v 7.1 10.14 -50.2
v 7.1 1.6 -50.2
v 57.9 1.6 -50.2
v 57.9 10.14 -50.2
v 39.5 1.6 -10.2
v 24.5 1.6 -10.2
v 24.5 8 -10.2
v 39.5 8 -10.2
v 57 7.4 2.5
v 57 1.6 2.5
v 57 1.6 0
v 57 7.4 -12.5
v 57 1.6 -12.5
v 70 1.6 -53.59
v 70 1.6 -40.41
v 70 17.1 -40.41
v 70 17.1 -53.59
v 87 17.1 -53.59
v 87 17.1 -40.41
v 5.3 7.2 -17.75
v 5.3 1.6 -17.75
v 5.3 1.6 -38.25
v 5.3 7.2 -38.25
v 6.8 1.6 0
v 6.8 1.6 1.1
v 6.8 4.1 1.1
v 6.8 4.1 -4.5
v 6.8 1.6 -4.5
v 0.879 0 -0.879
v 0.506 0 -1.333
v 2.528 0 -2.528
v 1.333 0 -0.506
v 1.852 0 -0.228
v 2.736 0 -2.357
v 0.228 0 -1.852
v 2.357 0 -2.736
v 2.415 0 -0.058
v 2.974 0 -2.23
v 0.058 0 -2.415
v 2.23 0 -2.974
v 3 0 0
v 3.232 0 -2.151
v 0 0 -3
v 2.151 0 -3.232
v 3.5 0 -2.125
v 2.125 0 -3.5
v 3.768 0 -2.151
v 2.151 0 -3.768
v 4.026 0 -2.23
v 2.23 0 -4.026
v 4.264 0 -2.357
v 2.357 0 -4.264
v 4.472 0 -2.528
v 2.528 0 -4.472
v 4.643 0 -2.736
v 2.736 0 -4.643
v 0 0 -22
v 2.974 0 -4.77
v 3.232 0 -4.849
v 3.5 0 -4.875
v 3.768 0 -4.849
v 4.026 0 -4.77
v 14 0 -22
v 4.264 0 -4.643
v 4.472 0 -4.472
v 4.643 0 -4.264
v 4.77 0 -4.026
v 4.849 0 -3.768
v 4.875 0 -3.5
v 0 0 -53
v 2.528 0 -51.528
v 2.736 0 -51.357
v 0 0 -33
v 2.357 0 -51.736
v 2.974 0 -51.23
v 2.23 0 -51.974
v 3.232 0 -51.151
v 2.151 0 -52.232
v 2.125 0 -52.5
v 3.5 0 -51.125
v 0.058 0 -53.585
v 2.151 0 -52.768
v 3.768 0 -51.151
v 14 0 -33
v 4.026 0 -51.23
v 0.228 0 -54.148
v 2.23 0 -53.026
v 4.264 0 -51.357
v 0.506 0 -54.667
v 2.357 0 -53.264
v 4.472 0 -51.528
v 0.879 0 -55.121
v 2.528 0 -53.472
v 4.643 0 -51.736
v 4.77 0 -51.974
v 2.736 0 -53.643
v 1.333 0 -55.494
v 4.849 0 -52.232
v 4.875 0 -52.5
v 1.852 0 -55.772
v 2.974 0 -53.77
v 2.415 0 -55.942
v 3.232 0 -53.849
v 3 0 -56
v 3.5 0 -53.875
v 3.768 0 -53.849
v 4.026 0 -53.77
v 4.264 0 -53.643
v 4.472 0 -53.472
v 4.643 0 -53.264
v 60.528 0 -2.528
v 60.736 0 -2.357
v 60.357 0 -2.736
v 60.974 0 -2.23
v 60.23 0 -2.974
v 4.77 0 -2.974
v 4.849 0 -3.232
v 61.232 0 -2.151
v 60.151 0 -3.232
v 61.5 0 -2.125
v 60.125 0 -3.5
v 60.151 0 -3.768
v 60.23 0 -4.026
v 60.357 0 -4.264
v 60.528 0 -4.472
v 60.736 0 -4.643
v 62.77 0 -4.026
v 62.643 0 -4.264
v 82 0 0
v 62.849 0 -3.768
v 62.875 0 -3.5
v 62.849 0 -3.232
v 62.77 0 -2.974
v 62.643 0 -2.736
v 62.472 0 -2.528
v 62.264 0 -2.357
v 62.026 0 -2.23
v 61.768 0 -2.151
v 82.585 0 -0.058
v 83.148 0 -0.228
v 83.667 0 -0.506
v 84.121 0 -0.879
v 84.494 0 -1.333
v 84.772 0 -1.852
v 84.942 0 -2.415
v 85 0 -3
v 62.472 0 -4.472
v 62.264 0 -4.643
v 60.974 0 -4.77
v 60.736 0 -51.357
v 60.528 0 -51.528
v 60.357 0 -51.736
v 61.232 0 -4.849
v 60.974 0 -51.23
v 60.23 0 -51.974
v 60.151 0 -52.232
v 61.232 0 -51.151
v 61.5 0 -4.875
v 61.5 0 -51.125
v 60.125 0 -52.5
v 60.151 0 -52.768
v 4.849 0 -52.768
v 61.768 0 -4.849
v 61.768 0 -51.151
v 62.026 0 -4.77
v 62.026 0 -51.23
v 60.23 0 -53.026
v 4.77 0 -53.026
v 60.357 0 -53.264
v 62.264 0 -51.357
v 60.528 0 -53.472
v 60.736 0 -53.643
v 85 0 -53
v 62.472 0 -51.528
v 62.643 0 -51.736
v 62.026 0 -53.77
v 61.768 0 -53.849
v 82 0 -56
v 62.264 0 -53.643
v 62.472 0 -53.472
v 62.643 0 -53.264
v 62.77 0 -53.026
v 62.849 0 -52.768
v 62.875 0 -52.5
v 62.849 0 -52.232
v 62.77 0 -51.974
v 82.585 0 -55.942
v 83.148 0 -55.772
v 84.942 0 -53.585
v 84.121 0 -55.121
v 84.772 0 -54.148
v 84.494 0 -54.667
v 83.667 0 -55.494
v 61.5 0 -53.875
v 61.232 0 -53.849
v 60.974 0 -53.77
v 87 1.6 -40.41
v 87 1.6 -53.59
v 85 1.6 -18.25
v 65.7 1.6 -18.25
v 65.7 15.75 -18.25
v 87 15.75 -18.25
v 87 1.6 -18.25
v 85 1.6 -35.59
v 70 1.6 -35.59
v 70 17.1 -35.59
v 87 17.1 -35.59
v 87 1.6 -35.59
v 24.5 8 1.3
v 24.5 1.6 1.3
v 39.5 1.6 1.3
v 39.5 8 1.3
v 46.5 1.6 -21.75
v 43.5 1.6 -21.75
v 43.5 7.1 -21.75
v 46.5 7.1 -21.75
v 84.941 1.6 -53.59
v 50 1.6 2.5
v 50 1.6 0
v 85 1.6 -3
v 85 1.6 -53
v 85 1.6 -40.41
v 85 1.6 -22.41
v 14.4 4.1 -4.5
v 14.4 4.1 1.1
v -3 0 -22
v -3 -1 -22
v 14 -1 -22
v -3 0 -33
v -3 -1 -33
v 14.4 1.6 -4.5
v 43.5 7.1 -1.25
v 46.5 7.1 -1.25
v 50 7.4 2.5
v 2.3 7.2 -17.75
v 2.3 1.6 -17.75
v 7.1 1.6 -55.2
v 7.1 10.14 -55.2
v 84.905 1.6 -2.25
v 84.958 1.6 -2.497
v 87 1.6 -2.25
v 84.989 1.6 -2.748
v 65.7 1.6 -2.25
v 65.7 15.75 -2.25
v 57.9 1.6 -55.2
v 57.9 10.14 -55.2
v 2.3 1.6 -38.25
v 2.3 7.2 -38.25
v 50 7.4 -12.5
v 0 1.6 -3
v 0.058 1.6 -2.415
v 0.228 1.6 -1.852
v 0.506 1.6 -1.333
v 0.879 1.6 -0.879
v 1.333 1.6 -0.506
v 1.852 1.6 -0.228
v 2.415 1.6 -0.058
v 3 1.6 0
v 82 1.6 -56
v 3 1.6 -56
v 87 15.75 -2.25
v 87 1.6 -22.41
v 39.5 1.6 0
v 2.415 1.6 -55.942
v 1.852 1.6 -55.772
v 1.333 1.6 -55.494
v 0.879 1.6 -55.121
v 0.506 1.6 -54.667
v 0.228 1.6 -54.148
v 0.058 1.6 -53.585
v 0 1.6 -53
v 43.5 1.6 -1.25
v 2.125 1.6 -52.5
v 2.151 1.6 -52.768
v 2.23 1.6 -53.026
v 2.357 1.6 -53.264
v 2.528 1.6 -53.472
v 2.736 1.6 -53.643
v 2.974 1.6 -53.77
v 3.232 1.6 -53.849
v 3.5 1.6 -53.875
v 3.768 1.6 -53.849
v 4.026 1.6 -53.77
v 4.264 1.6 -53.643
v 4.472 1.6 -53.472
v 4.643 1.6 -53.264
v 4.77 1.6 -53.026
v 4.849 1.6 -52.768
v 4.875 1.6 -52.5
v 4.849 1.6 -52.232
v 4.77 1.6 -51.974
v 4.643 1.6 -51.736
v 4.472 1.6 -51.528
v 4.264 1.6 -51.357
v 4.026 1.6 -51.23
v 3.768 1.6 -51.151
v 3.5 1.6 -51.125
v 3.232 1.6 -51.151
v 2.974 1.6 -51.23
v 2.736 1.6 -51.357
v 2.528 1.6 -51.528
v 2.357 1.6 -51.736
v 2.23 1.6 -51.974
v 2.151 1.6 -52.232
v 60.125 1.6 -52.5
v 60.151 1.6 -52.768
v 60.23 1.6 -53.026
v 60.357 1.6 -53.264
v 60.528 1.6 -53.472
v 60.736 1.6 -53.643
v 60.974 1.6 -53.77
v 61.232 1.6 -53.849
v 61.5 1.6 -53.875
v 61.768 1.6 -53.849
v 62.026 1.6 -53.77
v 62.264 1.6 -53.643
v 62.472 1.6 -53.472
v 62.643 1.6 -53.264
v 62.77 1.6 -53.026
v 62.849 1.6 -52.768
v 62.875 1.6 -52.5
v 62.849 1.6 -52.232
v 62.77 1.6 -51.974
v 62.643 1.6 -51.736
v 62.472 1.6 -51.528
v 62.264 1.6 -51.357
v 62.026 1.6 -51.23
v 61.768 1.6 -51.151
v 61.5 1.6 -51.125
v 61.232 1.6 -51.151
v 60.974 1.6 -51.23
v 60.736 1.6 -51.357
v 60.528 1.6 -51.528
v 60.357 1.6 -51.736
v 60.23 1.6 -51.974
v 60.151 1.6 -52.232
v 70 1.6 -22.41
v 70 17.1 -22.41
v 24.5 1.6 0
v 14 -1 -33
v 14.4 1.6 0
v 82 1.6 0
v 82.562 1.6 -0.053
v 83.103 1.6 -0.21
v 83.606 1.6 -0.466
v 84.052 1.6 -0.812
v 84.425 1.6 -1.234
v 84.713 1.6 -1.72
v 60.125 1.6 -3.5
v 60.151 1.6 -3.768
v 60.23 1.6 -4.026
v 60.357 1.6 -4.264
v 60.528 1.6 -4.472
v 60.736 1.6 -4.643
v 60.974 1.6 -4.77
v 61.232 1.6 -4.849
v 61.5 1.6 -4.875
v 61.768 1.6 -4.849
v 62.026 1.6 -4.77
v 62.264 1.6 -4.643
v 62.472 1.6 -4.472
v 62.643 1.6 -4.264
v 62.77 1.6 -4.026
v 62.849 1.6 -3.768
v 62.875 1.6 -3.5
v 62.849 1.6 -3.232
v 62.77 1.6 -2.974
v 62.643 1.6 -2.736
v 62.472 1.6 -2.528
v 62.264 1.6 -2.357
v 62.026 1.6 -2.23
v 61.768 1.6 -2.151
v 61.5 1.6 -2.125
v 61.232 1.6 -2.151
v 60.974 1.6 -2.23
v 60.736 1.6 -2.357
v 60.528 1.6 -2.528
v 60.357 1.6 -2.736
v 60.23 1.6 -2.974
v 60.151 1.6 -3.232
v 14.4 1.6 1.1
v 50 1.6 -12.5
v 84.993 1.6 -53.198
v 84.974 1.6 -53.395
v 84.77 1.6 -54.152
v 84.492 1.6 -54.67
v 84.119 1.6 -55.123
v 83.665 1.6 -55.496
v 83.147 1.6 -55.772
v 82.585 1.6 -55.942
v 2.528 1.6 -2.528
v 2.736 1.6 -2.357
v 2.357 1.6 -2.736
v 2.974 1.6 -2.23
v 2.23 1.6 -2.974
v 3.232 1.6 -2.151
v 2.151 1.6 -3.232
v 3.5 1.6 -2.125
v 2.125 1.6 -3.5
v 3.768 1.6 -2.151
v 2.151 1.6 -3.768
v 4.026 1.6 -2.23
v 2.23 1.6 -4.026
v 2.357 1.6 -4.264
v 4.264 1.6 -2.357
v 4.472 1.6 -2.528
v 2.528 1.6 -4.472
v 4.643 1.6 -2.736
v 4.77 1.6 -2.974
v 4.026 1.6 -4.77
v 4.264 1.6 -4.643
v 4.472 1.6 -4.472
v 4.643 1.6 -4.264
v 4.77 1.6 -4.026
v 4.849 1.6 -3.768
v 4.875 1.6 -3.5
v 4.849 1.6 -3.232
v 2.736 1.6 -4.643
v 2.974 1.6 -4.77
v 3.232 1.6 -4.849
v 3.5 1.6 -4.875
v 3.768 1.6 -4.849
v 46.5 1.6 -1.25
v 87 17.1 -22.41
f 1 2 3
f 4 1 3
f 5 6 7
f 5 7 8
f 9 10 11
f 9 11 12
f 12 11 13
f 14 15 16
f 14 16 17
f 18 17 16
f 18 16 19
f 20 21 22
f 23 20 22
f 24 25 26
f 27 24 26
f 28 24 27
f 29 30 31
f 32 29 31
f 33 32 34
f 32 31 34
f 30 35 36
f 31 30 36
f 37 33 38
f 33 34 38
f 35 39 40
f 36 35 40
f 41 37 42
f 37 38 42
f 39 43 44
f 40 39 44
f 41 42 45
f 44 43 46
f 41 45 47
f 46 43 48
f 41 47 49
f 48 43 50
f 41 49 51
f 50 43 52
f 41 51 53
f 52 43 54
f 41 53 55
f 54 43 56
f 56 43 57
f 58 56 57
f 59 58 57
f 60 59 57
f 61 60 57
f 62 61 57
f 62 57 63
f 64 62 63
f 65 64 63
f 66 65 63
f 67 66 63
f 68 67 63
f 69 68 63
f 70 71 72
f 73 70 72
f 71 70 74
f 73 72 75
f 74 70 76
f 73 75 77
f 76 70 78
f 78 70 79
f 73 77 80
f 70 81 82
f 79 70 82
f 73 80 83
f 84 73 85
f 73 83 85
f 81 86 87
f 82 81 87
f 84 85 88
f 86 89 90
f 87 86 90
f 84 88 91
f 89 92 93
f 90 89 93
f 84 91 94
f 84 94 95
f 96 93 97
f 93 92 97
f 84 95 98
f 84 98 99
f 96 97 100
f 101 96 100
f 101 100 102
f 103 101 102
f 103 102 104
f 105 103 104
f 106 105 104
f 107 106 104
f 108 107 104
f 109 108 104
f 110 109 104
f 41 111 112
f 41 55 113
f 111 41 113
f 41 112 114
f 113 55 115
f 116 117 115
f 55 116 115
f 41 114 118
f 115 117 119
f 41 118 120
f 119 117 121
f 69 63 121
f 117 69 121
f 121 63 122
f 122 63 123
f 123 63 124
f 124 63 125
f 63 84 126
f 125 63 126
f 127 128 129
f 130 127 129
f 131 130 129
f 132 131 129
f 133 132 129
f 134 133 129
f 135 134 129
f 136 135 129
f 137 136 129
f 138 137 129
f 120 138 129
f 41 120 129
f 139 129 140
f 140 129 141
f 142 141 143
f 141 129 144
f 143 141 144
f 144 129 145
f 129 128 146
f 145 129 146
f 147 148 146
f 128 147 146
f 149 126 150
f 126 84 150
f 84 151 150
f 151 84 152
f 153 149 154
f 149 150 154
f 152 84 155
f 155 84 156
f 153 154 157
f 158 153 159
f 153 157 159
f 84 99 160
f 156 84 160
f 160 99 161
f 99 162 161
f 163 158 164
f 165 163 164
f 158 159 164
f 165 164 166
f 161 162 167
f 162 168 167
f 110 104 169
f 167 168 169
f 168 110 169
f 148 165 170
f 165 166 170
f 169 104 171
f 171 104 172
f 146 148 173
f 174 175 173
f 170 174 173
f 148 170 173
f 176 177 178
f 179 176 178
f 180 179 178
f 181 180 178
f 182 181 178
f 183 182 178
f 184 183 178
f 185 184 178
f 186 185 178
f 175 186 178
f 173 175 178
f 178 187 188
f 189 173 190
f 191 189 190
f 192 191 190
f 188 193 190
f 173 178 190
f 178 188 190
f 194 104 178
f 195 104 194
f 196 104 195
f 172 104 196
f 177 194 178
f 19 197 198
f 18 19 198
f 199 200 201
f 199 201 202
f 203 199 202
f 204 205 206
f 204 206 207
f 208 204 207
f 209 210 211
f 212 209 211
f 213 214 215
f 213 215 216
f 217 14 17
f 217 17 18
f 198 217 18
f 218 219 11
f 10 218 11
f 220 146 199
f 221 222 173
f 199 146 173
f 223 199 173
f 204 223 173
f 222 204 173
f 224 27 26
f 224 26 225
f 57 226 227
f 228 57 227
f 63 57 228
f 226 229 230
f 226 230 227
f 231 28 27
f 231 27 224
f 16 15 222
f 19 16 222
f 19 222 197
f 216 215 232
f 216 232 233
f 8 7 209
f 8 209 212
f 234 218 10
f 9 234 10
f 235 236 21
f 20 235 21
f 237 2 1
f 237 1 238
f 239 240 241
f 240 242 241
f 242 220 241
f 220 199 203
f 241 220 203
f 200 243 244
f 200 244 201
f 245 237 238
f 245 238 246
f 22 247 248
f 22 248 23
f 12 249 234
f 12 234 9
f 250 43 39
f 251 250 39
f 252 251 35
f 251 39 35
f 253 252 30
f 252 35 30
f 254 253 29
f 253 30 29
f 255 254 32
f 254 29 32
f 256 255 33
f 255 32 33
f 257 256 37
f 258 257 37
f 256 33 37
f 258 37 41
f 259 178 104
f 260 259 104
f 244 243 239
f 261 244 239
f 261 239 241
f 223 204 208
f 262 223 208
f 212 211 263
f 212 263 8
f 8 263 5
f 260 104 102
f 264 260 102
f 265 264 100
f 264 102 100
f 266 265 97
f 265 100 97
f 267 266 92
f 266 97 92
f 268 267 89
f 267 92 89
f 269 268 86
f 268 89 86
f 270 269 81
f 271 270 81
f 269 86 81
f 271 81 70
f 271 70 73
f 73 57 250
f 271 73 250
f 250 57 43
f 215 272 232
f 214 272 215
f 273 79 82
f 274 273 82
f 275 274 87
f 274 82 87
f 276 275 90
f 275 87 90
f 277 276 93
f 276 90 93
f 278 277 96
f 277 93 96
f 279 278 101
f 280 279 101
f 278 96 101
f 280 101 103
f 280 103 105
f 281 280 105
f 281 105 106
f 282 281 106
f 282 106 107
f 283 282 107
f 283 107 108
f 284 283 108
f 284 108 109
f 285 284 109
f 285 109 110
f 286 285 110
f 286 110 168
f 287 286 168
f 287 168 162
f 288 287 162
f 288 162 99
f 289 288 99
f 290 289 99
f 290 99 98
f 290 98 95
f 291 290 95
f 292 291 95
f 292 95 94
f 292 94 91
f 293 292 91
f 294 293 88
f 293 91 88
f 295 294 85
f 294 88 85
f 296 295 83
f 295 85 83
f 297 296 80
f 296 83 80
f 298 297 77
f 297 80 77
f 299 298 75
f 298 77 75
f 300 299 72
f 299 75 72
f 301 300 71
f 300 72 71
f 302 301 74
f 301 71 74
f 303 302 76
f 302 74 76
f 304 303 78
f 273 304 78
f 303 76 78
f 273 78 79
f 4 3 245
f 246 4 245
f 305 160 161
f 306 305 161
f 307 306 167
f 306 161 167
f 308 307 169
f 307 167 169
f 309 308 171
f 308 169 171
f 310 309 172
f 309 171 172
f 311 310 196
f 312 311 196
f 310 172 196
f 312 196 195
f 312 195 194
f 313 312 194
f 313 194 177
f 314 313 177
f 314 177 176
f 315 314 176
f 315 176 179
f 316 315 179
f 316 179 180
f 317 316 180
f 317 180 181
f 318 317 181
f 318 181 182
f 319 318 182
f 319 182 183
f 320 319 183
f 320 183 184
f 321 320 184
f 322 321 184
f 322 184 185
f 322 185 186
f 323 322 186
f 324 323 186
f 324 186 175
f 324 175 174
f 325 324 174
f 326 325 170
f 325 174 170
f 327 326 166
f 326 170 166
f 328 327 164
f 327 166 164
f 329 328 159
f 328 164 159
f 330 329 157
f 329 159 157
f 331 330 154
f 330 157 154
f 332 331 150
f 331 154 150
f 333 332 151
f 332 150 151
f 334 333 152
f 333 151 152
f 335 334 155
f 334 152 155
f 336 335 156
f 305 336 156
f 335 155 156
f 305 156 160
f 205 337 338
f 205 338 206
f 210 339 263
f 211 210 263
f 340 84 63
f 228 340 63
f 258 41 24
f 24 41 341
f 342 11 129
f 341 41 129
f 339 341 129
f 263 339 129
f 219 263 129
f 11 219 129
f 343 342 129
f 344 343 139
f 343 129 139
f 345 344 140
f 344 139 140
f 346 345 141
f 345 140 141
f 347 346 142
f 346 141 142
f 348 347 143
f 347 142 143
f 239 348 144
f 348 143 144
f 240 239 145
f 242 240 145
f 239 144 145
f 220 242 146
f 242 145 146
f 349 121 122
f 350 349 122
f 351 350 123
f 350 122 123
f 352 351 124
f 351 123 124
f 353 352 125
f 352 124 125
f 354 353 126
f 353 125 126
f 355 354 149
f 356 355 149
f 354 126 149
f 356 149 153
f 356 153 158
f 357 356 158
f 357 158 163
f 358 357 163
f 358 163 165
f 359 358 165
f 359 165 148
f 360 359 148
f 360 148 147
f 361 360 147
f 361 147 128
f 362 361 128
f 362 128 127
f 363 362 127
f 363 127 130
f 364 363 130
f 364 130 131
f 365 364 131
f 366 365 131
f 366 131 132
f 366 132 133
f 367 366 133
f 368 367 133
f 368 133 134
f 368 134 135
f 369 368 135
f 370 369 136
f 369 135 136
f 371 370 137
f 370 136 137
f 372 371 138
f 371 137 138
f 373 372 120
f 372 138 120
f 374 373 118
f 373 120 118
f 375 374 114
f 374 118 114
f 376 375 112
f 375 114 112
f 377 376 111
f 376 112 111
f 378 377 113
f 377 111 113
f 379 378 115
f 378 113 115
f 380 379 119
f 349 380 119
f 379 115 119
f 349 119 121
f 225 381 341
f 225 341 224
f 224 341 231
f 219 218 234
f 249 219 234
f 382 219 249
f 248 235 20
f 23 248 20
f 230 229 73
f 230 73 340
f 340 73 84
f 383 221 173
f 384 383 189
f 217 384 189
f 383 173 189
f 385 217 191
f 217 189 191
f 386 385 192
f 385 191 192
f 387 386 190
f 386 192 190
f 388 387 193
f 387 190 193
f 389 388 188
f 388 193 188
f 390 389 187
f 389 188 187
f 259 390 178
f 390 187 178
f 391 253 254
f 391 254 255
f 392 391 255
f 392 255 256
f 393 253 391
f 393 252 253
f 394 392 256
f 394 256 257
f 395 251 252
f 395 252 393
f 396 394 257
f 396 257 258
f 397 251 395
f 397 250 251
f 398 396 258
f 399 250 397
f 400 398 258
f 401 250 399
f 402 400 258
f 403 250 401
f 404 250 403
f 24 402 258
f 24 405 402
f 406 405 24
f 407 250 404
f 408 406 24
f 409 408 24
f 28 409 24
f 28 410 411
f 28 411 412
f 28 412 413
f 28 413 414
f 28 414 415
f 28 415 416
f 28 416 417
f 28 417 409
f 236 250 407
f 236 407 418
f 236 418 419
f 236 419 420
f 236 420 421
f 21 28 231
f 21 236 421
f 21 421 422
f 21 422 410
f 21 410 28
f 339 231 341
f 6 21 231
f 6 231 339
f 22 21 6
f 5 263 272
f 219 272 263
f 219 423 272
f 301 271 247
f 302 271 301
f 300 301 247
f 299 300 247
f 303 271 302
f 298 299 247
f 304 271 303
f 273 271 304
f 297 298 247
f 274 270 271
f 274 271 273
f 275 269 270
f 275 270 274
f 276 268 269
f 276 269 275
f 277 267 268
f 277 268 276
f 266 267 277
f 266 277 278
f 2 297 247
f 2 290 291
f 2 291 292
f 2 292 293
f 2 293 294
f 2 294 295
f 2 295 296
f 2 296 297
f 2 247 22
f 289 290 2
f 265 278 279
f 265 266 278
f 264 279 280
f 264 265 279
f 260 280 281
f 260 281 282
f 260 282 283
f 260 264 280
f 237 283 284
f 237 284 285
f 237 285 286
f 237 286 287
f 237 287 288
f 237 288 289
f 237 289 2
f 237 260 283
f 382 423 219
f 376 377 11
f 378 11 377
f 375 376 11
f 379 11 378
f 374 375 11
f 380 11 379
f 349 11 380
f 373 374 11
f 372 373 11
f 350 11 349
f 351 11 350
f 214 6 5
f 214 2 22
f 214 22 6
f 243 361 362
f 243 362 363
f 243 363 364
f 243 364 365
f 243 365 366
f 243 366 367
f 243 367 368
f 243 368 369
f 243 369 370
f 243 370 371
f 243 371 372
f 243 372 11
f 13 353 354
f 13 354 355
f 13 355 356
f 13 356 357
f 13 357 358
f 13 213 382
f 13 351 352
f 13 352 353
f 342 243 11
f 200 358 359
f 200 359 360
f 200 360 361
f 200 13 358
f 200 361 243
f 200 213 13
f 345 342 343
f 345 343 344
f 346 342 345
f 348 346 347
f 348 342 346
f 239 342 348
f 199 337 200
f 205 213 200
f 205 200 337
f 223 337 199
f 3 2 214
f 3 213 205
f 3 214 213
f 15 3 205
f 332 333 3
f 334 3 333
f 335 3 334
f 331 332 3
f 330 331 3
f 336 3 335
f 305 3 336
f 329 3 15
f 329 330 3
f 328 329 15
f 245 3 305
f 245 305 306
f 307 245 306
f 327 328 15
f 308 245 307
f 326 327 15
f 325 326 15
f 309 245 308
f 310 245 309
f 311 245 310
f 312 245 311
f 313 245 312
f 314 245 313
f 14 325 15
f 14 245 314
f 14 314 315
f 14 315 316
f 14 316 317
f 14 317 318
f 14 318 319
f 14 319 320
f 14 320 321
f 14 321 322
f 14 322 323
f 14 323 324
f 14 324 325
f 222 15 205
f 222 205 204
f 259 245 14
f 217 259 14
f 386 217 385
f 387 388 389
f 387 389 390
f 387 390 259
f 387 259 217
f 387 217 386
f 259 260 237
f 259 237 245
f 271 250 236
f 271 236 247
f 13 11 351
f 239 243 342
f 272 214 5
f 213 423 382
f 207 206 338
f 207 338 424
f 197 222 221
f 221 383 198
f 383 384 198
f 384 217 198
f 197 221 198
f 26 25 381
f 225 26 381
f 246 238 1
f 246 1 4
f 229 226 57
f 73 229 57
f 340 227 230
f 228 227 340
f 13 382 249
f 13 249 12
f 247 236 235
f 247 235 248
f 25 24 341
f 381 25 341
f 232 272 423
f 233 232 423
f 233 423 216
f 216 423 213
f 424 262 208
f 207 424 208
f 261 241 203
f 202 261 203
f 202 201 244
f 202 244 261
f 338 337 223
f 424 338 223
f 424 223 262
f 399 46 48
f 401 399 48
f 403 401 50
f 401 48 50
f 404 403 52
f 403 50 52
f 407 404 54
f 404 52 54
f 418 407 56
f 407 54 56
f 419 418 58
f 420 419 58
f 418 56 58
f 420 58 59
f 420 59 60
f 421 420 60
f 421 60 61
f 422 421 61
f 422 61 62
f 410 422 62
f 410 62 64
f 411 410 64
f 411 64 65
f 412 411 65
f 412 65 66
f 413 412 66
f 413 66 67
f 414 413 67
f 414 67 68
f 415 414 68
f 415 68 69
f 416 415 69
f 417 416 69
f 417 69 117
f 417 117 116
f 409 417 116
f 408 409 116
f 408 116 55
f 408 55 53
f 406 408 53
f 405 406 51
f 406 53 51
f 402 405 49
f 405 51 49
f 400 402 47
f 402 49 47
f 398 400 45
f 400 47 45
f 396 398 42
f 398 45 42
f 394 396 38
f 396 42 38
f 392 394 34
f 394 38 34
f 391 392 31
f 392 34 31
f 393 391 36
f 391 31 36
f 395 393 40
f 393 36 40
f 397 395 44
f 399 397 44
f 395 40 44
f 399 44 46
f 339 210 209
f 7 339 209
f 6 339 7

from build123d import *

# Parameters (mm, degrees)
PCB_DEPTH              = 1.6
MOUNT_HOLES_D          = 2.75
SKETCH5_W              = 17
SKETCH5_H              = 13.18
USB_HOST_DEPTH         = 15.5
SKETCH6_W              = 21.3
SKETCH6_H              = 16
ETHERNET_DEPTH         = 14.15
SKETCH7_W              = 3
SKETCH7_H              = 20.5
CAMERA_CONNECTOR_DEPTH = 5.5
SKETCH9_W              = 15
SKETCH9_H              = 11.5
HDMI_DEPTH             = 6.4
SKETCH10_W             = 7
SKETCH10_H             = 15
AV_DEPTH               = 5.8
SKETCH12_W             = 7.6
SKETCH12_H             = 5.6
USB_MICRO_DEPTH        = 2.5
SKETCH13_W             = 3
SKETCH13_H             = 20.5
DISPLAY_DEPTH          = 5.6
SKETCH14_W             = 50.8
SKETCH14_H             = 5
GPIO_DEPTH             = 8.54
SKETCH15_W             = 17
SKETCH15_H             = 11
USD_CARD_DEPTH         = 1


with BuildPart() as part:
    # Sketch2 → PCB (new body)
    with BuildSketch(Plane(origin=(0, 0, 0), x_dir=(1, 0, 0), z_dir=(0, 1, 0))):
        with BuildLine():
            Line((3, 0), (82, 0))
            ThreePointArc((82, 0), (84.121320344, 0.878679656), (85, 3))
            Line((85, 3), (85, 53))
            ThreePointArc((85, 53), (84.121320344, 55.121320344), (82, 56))
            Line((82, 56), (3, 56))
            ThreePointArc((3, 56), (0.878679656, 55.121320344), (0, 53))
            Line((0, 53), (0, 3))
            ThreePointArc((0, 3), (0.878679656, 0.878679656), (3, 0))
        make_face()
    extrude(amount=PCB_DEPTH)

    # Mount Holes (through all)
    with Locations(Plane(origin=(0, 1.6, 0), x_dir=(1, 0, 0), z_dir=(0, 1, 0))):
        with Locations((3.5, 3.5), (3.5, 52.5), (61.5, 52.5), (61.5, 3.5)):
            Hole(MOUNT_HOLES_D / 2)

    # Sketch5 → USB Host (add)
    with BuildSketch(Plane(origin=(0, 1.6, 0), x_dir=(1, 0, 0), z_dir=(0, 1, 0))):
        with Locations((78.5, 47)):
            Rectangle(SKETCH5_W, SKETCH5_H)
        with Locations((78.5, 29)):
            Rectangle(SKETCH5_W, SKETCH5_H)
    extrude(amount=USB_HOST_DEPTH)

    # Sketch6 → Ethernet (add)
    with BuildSketch(Plane(origin=(0, 1.6, 0), x_dir=(1, 0, 0), z_dir=(0, 1, 0))):
        with Locations((76.35, 10.25)):
            Rectangle(SKETCH6_W, SKETCH6_H)
    extrude(amount=ETHERNET_DEPTH)

    # Sketch7 → Camera Connector (add)
    with BuildSketch(Plane(origin=(0, 1.6, 0), x_dir=(1, 0, 0), z_dir=(0, 1, 0))):
        with Locations((45, 11.5)):
            Rectangle(SKETCH7_W, SKETCH7_H)
    extrude(amount=CAMERA_CONNECTOR_DEPTH)

    # Sketch9 → HDMI (add)
    with BuildSketch(Plane(origin=(0, 1.6, 0), x_dir=(1, 0, 0), z_dir=(0, 1, 0))):
        with Locations((32, 4.45)):
            Rectangle(SKETCH9_W, SKETCH9_H)
    extrude(amount=HDMI_DEPTH)

    # Sketch10 → AV (add)
    with BuildSketch(Plane(origin=(0, 1.6, 0), x_dir=(1, 0, 0), z_dir=(0, 1, 0))):
        with Locations((53.5, 5)):
            Rectangle(SKETCH10_W, SKETCH10_H)
    extrude(amount=AV_DEPTH)

    # Sketch12 → USB-Micro (add)
    with BuildSketch(Plane(origin=(0, 1.6, 0), x_dir=(1, 0, 0), z_dir=(0, 1, 0))):
        with Locations((10.6, 1.7)):
            Rectangle(SKETCH12_W, SKETCH12_H)
    extrude(amount=USB_MICRO_DEPTH)

    # Sketch13 → Display (add)
    with BuildSketch(Plane(origin=(0, 1.6, 0), x_dir=(1, 0, 0), z_dir=(0, 1, 0))):
        with Locations((3.8, 28)):
            Rectangle(SKETCH13_W, SKETCH13_H)
    extrude(amount=DISPLAY_DEPTH)

    # Sketch14 → GPIO (add)
    with BuildSketch(Plane(origin=(0, 1.6, 0), x_dir=(1, 0, 0), z_dir=(0, 1, 0))):
        with Locations((32.5, 52.7)):
            Rectangle(SKETCH14_W, SKETCH14_H)
    extrude(amount=GPIO_DEPTH)

    # Sketch15 → uSD Card (add)
    with BuildSketch(Plane.XZ):
        with Locations((5.5, -27.5)):
            Rectangle(SKETCH15_W, SKETCH15_H)
    extrude(amount=USD_CARD_DEPTH)


solid = part.part
